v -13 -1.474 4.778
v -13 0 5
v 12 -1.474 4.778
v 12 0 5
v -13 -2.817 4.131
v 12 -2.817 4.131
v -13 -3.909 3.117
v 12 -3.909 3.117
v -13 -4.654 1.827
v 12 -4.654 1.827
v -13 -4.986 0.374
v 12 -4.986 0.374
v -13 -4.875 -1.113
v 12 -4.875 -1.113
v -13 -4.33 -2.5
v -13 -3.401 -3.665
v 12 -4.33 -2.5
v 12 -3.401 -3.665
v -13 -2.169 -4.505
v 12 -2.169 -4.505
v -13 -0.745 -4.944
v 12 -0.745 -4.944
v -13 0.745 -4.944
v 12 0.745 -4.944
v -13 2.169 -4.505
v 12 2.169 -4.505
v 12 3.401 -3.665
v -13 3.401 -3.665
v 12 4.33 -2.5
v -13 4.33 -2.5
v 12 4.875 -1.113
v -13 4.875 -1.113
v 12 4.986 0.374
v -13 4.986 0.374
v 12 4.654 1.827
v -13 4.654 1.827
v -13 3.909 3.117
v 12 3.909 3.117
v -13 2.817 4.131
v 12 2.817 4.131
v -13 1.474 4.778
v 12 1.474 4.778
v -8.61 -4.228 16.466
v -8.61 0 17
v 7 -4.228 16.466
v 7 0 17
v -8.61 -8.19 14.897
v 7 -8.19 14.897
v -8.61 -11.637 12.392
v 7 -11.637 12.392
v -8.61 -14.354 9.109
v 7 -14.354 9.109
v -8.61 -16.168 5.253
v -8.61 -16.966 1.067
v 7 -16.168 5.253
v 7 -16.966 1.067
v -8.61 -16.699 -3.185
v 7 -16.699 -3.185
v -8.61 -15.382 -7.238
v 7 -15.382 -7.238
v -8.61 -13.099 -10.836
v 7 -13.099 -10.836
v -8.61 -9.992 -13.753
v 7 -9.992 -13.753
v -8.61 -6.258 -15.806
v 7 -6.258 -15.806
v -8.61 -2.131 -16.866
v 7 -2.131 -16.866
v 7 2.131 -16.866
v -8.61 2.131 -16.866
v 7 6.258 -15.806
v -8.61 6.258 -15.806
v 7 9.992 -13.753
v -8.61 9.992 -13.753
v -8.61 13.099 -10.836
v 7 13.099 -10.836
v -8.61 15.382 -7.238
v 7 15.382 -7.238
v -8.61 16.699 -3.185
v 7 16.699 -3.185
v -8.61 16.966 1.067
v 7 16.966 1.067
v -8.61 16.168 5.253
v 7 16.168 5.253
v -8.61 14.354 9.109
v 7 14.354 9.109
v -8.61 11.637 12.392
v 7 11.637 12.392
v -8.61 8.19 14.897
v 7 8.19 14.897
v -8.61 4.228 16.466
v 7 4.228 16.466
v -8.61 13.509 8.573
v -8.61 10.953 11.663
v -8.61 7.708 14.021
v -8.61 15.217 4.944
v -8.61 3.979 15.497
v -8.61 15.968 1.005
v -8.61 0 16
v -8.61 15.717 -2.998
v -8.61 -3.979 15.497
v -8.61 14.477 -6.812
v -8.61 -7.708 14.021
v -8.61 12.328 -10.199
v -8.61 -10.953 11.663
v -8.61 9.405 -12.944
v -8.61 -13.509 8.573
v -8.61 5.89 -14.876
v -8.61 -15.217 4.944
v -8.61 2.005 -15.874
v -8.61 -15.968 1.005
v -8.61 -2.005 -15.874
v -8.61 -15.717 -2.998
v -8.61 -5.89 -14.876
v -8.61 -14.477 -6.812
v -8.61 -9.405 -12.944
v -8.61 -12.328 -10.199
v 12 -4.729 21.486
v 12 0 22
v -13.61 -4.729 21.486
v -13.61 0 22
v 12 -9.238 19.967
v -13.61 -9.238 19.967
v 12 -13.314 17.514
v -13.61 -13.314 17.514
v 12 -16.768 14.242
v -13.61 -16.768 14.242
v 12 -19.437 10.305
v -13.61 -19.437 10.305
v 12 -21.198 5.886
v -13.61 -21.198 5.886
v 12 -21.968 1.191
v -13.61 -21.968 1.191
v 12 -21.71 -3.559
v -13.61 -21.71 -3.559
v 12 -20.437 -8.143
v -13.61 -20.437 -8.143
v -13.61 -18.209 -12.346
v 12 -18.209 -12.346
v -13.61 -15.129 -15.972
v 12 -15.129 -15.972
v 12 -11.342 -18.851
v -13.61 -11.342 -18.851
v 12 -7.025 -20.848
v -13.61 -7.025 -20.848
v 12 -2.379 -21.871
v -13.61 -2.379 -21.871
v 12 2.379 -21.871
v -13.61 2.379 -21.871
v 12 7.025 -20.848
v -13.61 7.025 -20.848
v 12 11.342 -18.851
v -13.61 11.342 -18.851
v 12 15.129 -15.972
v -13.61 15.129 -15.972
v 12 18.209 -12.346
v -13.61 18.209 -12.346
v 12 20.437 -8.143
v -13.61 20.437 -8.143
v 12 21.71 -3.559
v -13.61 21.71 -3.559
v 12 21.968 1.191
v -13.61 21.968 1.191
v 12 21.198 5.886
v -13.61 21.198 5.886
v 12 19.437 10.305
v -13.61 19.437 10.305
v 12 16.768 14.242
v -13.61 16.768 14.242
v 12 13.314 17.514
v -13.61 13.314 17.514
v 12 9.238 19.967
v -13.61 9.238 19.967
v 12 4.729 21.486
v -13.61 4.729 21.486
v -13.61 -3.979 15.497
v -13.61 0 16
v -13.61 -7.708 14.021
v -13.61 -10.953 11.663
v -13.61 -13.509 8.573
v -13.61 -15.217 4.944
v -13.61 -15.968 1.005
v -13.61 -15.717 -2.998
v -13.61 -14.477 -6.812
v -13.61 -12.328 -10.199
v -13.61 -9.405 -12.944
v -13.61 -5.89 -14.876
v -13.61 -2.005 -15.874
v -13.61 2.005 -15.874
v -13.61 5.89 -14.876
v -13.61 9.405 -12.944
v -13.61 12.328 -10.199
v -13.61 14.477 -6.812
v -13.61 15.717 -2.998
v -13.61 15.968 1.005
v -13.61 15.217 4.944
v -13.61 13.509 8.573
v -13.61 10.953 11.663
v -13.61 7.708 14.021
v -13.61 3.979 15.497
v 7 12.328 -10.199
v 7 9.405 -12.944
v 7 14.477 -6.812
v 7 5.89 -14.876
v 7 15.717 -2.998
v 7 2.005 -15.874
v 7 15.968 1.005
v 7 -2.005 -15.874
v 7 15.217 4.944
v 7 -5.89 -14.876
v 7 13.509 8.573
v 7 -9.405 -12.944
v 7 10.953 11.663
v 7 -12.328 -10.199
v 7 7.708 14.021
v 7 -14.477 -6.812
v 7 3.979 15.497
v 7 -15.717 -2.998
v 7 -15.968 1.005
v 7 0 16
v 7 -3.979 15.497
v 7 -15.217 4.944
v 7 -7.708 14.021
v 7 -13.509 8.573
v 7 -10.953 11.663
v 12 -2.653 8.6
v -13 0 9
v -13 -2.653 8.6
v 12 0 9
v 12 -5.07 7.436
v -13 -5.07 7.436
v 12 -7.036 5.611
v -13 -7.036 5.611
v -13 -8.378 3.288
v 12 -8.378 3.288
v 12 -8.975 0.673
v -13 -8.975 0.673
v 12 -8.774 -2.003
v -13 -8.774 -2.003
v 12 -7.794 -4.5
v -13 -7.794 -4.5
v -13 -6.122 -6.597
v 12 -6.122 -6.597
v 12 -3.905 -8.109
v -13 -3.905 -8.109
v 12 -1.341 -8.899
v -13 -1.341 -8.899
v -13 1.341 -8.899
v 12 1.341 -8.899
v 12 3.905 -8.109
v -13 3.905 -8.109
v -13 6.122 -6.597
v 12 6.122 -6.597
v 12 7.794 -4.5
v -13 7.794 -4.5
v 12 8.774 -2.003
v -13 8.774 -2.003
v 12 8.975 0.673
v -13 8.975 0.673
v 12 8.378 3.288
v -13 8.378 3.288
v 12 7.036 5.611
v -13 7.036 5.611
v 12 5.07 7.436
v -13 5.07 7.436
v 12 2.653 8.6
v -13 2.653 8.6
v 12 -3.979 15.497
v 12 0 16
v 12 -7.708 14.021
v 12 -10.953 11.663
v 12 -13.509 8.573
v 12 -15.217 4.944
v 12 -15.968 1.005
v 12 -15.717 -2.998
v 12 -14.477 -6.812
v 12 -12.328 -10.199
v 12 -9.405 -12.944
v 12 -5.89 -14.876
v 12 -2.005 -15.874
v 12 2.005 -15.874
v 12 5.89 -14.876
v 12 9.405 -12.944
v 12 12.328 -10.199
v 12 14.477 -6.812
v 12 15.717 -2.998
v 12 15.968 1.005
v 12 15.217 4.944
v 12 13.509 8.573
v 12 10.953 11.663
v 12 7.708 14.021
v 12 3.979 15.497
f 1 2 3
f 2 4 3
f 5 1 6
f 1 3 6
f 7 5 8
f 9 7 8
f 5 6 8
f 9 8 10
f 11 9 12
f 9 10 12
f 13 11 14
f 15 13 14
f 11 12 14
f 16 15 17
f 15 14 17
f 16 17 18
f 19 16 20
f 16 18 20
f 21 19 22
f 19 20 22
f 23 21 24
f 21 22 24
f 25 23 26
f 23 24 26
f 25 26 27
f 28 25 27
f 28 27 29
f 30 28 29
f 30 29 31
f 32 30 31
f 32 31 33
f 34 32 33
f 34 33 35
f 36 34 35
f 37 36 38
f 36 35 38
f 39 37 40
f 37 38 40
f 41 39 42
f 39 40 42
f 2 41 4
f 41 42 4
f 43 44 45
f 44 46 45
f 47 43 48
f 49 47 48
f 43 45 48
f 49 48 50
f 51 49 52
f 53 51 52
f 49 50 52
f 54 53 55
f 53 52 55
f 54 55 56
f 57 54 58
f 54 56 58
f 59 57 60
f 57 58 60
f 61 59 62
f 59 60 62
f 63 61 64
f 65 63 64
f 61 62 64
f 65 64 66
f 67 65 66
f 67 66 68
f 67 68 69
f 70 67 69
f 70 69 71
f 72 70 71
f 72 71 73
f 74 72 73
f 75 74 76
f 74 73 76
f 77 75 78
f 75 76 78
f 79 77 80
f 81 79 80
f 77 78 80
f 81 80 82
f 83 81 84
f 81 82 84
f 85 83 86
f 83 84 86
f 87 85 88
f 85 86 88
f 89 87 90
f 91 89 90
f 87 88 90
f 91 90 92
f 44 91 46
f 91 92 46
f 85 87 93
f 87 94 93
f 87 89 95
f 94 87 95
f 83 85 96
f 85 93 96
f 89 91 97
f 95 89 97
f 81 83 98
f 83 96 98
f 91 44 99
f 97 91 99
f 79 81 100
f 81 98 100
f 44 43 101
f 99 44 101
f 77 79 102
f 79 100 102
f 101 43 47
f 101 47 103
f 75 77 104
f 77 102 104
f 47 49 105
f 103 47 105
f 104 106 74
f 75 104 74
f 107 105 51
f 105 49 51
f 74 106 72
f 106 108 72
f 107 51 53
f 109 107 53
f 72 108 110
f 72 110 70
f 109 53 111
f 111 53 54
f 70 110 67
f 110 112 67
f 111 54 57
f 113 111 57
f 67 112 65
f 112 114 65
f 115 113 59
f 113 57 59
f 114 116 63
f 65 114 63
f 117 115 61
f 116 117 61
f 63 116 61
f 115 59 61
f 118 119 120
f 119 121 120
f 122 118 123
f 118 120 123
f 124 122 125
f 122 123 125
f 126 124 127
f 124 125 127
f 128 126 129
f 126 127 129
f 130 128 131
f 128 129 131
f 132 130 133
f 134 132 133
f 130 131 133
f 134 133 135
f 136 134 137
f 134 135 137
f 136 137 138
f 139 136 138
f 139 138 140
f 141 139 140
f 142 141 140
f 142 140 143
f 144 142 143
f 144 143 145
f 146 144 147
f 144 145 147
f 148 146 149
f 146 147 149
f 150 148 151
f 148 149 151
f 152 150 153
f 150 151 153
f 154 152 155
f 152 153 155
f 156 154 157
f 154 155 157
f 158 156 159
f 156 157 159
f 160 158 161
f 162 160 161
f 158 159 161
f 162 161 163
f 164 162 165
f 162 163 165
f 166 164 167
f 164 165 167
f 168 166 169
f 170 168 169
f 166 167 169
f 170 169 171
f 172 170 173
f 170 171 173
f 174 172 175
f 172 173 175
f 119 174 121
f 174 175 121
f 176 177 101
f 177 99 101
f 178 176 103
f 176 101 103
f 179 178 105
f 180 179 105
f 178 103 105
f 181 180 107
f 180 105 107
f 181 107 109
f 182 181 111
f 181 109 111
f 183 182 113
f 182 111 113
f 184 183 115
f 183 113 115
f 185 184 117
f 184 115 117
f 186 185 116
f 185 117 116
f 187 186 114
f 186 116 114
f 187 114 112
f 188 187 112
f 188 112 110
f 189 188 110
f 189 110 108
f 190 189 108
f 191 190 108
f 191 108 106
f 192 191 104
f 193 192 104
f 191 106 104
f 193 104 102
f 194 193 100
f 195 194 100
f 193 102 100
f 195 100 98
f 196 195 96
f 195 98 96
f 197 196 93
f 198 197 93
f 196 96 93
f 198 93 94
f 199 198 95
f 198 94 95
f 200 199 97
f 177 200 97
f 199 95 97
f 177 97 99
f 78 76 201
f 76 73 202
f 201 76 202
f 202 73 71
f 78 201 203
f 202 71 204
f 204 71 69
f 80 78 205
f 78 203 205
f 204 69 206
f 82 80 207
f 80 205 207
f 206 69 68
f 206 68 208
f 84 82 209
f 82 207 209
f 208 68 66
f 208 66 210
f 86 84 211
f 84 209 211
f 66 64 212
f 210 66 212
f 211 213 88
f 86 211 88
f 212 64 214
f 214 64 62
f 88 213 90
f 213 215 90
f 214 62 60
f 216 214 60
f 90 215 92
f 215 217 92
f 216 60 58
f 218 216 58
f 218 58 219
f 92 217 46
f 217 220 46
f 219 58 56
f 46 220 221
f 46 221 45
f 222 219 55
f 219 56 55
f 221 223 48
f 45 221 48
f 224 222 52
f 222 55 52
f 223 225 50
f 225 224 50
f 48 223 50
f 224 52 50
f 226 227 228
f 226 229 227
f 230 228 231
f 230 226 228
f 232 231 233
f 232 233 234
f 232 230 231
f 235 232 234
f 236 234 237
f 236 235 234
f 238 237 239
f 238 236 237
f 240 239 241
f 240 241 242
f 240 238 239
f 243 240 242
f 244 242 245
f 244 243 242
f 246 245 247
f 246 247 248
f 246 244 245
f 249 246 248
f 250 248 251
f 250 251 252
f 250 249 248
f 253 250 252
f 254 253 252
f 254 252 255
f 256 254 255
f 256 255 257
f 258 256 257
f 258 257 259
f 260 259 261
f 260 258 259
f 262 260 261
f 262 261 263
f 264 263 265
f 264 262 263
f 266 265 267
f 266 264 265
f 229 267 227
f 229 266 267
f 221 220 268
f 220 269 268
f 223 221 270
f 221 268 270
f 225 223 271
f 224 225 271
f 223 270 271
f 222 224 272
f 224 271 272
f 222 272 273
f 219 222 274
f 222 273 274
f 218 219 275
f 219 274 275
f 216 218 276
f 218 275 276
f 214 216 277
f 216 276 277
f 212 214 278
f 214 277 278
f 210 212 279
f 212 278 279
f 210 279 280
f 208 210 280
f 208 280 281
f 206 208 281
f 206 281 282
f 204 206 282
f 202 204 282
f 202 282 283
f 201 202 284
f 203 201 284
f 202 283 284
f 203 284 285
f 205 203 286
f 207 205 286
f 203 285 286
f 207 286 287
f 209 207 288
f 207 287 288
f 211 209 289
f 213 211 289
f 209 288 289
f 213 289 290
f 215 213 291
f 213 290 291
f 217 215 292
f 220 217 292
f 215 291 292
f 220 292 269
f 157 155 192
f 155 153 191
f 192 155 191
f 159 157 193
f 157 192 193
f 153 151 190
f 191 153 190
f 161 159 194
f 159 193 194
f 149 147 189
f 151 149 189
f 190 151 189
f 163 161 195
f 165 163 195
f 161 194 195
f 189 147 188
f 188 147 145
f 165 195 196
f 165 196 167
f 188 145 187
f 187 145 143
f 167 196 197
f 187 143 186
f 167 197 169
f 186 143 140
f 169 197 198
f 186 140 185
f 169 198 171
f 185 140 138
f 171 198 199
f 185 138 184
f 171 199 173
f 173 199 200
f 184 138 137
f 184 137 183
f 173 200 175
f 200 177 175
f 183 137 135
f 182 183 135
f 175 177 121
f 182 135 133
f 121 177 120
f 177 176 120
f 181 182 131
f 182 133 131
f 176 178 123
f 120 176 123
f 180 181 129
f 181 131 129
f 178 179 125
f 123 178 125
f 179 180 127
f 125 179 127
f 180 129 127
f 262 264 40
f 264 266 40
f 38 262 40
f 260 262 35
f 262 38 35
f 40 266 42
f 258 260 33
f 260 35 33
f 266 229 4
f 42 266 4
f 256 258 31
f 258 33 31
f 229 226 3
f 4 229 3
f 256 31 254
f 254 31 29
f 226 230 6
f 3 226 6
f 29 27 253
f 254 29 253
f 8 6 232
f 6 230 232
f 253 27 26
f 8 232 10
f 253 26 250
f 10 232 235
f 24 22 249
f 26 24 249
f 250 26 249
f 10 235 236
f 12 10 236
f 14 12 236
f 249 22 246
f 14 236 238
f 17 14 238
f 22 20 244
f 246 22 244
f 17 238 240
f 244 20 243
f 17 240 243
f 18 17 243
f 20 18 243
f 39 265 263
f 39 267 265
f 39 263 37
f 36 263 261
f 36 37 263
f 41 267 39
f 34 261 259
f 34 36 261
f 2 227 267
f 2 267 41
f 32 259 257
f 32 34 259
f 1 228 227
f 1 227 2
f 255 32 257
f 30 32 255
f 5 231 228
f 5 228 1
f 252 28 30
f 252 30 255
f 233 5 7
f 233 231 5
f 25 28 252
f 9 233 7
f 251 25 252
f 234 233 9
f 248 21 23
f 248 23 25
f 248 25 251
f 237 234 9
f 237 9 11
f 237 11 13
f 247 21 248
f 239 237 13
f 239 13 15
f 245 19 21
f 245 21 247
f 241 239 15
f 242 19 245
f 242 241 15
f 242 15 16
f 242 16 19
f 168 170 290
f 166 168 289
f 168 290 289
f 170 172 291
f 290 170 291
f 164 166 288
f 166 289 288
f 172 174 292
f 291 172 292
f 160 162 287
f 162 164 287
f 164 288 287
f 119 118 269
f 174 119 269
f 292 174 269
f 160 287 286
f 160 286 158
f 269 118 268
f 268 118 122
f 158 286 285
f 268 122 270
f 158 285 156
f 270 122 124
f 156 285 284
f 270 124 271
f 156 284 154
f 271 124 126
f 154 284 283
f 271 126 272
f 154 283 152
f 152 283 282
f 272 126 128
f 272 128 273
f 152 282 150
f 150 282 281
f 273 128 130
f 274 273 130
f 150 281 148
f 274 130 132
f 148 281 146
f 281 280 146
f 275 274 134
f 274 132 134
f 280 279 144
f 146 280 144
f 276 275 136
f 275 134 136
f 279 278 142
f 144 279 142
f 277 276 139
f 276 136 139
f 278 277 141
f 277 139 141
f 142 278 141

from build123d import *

# Parameters (mm, degrees)
F0_W = 25
F0_H = 4


with BuildPart() as f1:
    # F0 (on Front) → F1 (revolve)
    with BuildSketch(Plane.XZ):
        with Locations((-0.5, 7)):
            Rectangle(F0_W, F0_H)
        Polygon((-13.609726, 22), (-13.609726, 16), (-8.609726, 16), (-8.609726, 17), (7, 17), (7, 16), (12, 16), (12, 22), align=None)
    revolve(axis=Axis((-0.374998, 0, 0), (1, 0, 0)))


solid = f1.part
